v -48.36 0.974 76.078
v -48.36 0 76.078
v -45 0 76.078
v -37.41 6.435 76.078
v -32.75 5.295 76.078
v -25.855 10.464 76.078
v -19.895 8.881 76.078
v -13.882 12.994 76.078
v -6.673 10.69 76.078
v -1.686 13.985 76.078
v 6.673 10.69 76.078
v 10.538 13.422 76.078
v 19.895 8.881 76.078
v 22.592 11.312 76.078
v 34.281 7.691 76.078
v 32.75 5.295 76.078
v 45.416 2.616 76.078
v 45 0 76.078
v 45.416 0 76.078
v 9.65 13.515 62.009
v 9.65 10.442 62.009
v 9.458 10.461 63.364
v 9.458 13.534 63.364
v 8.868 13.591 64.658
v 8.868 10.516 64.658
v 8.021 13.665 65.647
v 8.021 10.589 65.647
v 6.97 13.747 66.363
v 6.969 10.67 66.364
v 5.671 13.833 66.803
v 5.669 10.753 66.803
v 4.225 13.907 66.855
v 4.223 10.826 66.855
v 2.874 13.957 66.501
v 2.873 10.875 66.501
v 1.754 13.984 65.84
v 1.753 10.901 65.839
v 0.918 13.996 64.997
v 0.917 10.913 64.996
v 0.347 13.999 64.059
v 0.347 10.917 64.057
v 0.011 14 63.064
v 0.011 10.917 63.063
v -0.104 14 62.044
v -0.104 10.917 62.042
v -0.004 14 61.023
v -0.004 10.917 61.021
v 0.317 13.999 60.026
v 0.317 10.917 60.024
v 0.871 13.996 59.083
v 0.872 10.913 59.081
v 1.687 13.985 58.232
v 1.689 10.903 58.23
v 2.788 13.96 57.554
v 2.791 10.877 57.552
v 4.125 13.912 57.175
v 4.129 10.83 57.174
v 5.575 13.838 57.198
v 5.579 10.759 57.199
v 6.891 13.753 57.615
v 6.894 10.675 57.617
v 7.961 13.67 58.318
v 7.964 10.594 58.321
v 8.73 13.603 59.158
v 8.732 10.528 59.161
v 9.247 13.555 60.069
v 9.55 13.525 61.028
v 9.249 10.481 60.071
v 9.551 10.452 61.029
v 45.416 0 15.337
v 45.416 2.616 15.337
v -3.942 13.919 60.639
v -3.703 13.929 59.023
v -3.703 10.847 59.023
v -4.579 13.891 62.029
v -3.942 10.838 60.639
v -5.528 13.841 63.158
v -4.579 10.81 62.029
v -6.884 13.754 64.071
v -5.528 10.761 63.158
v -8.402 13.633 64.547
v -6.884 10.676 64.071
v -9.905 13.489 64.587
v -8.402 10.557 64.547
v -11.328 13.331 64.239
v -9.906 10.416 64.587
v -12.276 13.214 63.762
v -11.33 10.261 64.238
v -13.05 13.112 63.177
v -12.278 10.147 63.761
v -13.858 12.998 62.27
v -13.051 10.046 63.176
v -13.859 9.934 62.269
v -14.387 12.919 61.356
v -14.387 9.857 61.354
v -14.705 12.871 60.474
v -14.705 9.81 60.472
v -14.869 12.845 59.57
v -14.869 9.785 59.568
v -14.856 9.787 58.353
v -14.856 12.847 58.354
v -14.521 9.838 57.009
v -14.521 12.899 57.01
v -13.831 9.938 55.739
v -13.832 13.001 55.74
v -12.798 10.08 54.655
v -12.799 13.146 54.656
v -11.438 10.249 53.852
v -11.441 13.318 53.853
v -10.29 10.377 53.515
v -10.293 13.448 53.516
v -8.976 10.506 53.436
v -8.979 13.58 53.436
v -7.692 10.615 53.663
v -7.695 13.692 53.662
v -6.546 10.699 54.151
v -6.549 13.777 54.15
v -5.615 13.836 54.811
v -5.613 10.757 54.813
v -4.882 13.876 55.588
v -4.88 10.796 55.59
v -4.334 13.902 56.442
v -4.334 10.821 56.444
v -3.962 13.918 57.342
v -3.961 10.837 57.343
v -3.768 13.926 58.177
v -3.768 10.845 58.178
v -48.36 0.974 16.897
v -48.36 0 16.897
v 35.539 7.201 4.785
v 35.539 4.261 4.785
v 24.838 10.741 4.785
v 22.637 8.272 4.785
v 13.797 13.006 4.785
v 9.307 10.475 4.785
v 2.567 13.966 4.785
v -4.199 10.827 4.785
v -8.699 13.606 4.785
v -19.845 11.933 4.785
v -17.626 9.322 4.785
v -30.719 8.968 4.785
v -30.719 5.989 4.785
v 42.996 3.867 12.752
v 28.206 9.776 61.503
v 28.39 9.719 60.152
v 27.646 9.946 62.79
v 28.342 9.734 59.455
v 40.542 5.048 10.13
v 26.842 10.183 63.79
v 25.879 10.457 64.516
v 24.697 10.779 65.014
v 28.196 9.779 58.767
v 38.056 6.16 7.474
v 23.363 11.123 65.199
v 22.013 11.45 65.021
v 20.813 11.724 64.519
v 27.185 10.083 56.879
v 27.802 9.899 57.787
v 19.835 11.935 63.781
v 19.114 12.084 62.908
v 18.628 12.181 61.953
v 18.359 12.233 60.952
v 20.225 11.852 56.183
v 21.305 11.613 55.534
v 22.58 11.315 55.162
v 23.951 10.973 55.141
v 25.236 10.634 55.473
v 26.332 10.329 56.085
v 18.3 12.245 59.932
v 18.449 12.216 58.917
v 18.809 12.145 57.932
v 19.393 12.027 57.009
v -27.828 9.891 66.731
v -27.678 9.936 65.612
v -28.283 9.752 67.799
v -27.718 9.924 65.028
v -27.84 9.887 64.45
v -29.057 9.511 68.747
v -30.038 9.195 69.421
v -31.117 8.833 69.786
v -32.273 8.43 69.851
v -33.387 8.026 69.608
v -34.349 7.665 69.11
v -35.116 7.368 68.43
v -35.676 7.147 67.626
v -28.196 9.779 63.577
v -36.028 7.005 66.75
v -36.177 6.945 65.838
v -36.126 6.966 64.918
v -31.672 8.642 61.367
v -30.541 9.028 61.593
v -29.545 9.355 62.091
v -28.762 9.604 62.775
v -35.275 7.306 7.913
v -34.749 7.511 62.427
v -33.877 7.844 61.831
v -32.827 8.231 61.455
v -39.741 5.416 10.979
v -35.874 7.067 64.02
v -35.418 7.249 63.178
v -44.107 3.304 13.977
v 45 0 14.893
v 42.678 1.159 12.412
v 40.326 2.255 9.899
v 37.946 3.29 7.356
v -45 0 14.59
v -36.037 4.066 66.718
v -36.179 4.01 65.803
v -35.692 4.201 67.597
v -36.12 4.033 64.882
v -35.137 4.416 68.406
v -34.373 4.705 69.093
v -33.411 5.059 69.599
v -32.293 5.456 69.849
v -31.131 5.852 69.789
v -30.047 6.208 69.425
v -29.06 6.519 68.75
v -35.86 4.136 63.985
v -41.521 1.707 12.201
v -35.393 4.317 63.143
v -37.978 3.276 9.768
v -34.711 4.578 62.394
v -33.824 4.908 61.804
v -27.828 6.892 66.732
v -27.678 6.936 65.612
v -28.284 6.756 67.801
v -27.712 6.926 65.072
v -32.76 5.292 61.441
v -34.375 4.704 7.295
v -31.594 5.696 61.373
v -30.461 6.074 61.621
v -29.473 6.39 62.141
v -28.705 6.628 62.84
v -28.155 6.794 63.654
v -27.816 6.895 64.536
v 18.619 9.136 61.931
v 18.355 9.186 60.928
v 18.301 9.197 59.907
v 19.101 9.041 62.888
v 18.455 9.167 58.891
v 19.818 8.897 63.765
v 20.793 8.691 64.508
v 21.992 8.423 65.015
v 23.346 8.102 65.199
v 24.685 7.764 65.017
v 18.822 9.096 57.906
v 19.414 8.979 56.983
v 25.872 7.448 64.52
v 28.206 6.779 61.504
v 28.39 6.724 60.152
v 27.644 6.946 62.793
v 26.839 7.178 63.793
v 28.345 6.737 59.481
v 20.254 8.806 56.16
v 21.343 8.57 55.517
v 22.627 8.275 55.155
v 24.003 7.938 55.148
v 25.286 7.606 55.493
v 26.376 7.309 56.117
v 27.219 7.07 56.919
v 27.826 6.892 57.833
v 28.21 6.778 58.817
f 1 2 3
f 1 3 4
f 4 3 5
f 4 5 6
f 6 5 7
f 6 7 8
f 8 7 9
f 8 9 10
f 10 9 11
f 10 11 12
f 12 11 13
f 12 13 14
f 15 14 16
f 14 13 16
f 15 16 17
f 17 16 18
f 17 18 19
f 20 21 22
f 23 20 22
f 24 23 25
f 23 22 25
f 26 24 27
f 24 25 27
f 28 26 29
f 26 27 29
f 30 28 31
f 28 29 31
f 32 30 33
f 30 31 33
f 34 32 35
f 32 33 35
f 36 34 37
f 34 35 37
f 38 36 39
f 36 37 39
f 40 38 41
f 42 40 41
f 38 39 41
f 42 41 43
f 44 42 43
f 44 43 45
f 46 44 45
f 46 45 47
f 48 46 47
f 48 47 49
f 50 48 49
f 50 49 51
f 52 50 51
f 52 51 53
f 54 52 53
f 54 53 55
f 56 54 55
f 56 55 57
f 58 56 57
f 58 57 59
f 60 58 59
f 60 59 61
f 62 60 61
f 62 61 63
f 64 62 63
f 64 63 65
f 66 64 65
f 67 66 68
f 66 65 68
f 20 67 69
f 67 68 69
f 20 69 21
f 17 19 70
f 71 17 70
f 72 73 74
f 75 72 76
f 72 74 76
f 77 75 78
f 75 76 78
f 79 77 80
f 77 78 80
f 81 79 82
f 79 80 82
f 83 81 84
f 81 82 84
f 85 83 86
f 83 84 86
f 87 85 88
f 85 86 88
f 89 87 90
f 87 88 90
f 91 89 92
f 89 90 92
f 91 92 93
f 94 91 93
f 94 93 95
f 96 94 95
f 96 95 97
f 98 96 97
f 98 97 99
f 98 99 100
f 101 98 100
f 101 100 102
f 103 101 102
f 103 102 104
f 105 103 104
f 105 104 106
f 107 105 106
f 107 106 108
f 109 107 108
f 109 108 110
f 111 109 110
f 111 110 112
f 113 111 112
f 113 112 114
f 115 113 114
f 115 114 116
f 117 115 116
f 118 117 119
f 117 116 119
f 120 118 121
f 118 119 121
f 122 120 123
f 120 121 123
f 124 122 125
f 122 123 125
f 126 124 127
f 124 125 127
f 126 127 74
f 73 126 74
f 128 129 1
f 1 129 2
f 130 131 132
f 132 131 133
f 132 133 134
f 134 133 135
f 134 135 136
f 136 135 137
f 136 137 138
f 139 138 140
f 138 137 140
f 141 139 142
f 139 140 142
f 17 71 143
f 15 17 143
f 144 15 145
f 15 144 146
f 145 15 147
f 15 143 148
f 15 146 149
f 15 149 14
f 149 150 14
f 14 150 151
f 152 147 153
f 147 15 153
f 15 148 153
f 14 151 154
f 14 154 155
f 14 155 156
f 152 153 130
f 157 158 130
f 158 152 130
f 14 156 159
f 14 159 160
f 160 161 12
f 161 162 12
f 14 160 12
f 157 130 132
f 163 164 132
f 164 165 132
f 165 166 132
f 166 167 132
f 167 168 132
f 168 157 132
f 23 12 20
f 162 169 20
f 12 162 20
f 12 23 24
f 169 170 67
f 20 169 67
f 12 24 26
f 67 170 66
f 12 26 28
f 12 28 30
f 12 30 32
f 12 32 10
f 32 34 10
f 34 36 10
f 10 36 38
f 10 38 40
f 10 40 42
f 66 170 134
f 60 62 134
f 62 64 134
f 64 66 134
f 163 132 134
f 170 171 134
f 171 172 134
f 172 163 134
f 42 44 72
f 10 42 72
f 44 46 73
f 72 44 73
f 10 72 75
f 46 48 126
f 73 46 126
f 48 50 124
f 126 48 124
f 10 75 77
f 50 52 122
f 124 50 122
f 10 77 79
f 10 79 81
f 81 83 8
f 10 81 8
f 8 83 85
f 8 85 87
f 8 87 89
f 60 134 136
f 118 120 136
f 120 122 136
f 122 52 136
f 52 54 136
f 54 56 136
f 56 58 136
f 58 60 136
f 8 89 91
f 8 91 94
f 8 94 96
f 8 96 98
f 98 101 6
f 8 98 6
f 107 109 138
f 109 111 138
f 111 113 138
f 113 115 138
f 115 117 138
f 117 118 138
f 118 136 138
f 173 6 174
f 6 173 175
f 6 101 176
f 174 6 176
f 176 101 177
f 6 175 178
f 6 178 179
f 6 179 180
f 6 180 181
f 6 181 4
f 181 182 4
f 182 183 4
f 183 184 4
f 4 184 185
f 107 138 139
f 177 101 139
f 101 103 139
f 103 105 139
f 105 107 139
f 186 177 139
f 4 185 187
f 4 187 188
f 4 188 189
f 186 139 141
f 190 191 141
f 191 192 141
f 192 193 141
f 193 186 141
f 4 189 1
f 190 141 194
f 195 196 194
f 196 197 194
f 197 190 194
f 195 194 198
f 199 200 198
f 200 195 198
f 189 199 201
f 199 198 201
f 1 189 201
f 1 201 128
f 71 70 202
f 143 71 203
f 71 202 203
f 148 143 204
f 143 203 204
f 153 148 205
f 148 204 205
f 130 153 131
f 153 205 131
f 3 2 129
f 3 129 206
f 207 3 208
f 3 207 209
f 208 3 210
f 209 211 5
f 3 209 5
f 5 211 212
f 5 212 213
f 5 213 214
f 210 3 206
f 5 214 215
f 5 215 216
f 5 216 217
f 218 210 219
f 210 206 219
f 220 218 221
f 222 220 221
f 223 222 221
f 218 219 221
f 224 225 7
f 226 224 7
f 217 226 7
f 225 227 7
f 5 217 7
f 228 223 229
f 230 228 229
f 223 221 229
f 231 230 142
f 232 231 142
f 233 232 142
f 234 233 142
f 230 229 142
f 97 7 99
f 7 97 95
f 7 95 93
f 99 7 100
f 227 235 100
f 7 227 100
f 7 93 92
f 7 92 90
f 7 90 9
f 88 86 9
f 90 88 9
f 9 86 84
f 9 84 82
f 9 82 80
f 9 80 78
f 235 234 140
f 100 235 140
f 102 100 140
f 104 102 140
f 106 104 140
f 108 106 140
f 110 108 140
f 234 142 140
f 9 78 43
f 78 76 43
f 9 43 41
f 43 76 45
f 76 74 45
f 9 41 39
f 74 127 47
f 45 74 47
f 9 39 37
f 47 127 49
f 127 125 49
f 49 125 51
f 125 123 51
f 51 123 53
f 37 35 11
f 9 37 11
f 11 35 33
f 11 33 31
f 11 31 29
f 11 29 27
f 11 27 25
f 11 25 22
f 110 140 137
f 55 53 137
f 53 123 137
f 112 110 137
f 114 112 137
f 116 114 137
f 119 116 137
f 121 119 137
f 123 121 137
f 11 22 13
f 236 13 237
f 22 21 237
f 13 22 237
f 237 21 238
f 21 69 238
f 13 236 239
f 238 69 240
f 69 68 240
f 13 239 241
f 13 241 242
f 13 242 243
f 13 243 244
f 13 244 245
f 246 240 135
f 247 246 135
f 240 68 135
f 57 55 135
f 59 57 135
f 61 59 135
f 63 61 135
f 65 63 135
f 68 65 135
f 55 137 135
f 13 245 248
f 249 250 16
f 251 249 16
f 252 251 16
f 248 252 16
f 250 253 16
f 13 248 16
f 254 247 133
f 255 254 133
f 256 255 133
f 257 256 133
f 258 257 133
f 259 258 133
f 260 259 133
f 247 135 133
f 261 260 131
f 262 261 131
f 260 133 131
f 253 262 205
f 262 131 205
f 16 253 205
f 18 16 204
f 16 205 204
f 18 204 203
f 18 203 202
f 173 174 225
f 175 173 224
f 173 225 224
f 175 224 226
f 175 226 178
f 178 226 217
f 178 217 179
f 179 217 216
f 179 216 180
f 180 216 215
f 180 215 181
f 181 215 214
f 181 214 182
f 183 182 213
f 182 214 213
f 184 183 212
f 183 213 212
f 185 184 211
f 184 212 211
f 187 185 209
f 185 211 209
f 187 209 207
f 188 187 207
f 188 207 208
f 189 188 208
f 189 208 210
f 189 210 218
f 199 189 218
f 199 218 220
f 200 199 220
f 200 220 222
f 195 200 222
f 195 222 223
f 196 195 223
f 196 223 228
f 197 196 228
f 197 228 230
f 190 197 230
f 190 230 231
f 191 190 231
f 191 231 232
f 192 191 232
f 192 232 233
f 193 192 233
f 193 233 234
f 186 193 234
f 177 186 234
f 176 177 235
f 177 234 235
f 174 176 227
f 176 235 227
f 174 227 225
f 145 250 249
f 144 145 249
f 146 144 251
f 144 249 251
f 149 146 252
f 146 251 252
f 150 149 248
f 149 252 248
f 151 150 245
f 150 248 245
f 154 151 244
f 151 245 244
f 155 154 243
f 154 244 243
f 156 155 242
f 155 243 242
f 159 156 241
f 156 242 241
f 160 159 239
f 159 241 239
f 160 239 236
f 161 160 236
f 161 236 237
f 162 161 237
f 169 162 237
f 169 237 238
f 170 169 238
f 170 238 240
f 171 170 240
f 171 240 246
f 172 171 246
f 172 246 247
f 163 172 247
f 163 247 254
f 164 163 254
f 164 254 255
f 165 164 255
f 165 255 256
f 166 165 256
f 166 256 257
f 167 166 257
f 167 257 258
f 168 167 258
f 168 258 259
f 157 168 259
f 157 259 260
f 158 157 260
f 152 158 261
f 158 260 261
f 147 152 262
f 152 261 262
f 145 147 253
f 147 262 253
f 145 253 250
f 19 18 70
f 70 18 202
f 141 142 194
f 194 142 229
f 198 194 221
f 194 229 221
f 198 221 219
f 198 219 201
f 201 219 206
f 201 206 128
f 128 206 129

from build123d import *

# Parameters (mm, degrees)
SKETCH002_R   = 4.252865
SKETCH002_R_2 = 5.59623
SKETCH002_R_3 = 4.877243
SKETCH002_R_4 = 5.047412
PAD001_DEPTH  = 20
PAD_DEPTH     = 80
SKETCH001_W   = 100
SKETCH001_H   = 80
POCKET_DEPTH  = 14.001


with BuildPart() as pad001:
    # Sketch002 → Pad001 (new body)
    with BuildSketch(Plane.XZ):
        with Locations((-31.93054, 65.612114)):
            Circle(SKETCH002_R)
        with Locations((-9.299617, 59.023361)):
            Circle(SKETCH002_R_2)
        with Locations((4.772683, 62.008789)):
            Circle(SKETCH002_R_3)
        with Locations((23.342754, 60.151779)):
            Circle(SKETCH002_R_4)
    extrude(amount=-PAD001_DEPTH)


with BuildPart() as cut:
    # Sketch → Pad (new body)
    with BuildSketch(Plane.XY):
        with BuildLine():
            Line((45, 0), (50, 0))
            ThreePointArc((50, 0), (0, 14), (-50, 0))
            Line((-50, 0), (-45, 0))
            ThreePointArc((-45, 0), (0, 10.917116), (45, 0))
        make_face()
    extrude(amount=PAD_DEPTH)

    # Sketch001 → Pocket (cut, through all)
    with BuildSketch(Plane.XZ):
        with Locations((0, 40)):
            Rectangle(SKETCH001_W, SKETCH001_H)
        Polygon((-30.718987, 4.784545), (-48.360384, 16.897081), (-48.360384, 76.077912), (45.416021, 76.077912), (45.416021, 15.337389), (35.539104, 4.784545), align=None, mode=Mode.SUBTRACT)
    extrude(amount=-POCKET_DEPTH, mode=Mode.SUBTRACT)

    # Cut: cut Pad001
    add(pad001.part, mode=Mode.SUBTRACT)


solid = cut.part
